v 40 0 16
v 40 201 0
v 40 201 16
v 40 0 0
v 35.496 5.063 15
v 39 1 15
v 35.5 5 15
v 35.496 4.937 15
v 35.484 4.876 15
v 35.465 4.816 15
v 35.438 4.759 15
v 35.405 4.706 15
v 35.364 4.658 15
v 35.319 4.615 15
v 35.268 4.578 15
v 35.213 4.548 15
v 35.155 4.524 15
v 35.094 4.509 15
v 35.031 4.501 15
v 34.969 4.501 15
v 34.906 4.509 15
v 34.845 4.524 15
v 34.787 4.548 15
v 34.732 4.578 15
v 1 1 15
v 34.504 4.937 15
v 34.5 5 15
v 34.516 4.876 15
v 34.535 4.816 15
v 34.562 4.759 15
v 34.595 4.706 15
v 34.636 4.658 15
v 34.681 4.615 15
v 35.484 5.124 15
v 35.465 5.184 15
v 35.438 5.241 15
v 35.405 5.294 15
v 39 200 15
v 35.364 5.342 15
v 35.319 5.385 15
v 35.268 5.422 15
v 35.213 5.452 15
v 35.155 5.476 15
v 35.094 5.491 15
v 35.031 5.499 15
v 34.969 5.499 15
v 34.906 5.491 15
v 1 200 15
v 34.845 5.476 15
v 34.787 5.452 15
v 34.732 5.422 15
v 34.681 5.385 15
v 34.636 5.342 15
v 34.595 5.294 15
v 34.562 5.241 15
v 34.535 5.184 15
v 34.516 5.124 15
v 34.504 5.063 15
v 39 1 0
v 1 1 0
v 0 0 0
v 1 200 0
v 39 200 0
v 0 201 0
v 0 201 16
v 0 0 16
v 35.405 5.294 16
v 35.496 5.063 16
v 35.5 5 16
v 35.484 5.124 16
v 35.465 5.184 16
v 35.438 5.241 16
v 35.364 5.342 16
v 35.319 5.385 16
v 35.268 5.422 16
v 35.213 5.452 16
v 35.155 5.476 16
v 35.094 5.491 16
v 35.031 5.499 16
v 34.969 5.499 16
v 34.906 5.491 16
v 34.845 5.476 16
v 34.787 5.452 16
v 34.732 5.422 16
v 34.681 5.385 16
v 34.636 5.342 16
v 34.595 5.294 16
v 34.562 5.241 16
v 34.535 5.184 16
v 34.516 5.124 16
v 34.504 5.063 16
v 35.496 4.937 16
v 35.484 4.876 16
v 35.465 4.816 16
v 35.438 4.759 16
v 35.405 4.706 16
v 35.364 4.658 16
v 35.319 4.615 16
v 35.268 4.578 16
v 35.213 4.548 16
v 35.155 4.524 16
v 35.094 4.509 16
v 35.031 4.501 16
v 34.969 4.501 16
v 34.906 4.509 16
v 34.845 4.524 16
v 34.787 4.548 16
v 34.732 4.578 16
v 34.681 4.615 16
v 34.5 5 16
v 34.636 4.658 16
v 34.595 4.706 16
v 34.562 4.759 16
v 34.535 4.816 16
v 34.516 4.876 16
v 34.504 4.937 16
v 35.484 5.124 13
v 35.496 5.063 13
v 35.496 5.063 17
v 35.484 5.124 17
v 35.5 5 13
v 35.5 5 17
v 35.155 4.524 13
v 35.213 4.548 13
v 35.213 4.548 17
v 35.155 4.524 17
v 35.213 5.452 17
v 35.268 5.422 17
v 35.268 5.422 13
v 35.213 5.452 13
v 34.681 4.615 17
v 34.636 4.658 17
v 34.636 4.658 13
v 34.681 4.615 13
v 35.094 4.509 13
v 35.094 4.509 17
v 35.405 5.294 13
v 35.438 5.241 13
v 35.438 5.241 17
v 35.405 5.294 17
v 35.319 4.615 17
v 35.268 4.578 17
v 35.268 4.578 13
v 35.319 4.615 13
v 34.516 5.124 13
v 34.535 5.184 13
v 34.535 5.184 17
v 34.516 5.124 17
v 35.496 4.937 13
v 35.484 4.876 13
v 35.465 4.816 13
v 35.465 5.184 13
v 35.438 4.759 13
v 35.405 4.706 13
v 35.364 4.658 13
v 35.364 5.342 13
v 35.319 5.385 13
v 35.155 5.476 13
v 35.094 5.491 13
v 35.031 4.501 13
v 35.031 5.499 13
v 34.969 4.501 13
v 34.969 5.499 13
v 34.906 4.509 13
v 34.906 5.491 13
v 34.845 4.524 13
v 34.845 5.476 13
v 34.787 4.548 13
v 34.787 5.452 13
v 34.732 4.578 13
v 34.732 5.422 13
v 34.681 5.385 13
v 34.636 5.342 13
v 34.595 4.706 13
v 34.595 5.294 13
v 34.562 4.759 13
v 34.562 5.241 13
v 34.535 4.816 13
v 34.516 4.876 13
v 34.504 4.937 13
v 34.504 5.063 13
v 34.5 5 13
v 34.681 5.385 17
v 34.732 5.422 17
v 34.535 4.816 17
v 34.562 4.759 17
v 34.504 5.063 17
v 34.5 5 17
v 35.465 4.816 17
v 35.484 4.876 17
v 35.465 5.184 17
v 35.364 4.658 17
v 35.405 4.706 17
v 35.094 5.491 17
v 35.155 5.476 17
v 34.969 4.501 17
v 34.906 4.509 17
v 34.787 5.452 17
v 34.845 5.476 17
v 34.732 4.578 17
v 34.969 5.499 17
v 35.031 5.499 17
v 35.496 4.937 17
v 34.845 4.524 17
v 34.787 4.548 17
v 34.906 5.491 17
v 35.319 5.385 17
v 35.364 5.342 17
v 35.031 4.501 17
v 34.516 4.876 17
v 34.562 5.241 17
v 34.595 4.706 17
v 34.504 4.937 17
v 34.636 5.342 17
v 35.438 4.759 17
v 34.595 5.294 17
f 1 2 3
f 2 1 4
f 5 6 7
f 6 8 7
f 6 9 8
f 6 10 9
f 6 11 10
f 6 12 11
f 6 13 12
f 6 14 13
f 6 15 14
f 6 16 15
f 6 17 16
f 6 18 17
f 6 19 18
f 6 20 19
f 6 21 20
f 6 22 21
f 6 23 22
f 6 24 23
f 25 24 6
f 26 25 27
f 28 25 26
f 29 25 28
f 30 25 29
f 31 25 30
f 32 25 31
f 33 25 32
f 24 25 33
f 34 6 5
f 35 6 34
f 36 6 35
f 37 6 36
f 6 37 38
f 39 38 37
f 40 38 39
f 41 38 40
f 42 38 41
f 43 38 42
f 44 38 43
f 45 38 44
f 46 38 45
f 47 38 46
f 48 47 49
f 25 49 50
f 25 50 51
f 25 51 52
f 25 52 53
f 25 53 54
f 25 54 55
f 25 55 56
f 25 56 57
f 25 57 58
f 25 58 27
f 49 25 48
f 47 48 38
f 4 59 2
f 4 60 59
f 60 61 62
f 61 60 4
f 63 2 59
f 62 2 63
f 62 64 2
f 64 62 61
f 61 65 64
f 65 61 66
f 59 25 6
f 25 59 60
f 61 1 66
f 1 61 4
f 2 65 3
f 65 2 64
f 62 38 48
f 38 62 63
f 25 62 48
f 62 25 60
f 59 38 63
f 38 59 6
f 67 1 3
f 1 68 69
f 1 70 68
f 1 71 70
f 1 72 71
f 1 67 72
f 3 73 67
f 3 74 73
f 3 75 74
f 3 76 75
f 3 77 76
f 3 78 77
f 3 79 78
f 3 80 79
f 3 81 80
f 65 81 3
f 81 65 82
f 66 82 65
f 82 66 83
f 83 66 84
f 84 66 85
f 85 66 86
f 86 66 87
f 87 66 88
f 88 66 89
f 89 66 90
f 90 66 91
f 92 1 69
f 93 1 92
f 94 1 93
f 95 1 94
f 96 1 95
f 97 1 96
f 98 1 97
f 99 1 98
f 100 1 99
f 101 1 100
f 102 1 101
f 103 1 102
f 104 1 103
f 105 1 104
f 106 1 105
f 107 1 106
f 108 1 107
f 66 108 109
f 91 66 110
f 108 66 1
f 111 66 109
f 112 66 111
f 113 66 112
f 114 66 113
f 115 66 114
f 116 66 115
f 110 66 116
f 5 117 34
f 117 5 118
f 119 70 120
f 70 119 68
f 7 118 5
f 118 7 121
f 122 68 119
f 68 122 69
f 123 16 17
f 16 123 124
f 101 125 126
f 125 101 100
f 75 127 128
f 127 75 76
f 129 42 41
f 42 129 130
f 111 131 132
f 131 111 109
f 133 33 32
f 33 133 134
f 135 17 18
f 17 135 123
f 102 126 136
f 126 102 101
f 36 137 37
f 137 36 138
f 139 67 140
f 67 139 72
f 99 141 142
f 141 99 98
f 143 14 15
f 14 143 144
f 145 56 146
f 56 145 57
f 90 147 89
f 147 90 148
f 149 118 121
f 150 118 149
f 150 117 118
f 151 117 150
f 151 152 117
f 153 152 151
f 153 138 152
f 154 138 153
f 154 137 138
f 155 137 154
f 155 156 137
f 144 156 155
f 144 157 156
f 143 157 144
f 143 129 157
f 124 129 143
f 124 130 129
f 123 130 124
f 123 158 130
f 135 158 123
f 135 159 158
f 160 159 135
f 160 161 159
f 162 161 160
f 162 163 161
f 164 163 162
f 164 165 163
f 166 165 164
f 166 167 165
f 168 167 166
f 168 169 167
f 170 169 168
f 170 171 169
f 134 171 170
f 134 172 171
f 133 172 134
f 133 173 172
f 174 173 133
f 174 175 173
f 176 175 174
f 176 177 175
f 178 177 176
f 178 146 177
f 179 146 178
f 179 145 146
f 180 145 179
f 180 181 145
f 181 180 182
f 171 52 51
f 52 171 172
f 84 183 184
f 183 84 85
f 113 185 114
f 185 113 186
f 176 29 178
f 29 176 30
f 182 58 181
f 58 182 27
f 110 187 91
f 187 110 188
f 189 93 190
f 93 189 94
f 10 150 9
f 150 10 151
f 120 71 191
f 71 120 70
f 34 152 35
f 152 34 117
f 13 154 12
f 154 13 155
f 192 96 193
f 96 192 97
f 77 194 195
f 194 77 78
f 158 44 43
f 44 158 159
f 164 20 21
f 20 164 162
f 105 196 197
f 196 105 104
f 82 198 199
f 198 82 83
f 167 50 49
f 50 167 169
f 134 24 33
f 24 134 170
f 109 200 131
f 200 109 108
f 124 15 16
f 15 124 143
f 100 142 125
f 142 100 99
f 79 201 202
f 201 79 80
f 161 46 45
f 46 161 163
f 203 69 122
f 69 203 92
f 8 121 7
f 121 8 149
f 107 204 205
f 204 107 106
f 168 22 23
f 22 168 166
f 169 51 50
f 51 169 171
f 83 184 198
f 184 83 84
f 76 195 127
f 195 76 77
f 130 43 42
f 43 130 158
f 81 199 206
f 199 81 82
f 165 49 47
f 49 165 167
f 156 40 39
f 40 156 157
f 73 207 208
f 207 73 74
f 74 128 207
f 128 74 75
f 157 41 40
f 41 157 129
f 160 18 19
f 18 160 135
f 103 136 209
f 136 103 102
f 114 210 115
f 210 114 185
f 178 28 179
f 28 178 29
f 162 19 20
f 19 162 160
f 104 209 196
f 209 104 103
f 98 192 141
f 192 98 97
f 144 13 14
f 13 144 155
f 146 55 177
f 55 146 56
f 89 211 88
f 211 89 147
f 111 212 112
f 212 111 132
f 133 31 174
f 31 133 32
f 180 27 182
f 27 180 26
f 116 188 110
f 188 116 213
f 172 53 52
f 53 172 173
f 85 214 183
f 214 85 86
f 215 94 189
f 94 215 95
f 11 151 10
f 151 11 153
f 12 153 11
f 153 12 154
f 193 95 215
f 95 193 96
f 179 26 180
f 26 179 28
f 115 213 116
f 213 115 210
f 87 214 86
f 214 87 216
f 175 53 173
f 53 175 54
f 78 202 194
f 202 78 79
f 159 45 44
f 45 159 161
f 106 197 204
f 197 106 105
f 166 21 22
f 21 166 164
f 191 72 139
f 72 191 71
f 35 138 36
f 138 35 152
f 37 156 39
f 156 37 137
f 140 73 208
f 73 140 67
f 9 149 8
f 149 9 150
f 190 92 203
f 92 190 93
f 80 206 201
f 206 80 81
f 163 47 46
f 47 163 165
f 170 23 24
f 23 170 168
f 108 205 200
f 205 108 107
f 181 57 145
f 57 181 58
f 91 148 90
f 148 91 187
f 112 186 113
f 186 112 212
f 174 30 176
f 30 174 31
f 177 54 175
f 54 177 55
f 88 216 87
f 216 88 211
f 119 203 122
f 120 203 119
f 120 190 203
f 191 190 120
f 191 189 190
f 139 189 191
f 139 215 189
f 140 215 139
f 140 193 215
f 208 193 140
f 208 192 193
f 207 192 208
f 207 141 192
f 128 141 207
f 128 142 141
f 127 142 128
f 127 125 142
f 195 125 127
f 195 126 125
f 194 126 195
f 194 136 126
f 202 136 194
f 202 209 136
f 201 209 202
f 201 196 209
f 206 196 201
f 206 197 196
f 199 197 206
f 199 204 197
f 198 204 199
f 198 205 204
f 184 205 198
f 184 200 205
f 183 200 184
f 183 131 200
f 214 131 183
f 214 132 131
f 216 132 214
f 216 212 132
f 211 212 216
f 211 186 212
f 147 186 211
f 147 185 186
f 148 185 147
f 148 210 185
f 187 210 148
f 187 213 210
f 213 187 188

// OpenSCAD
$fn=50;
width=1;
height=15;
length1=40;
length2=200;
module wall(length) {
cube([length,width,height]);
}
wall(length1);
translate([0,length2,0])
    wall(length1);
translate([width,0,0])
    rotate([0,0,90])
        wall(length2);
translate([length1,0,0])
    rotate([0,0,90])
        wall(length2);
// ceiling
translate([0,0,height])
    cube([length1,length2+width,width]);
// laser module
translate([35,5,height-2])
    cylinder(h=4,r=.5);
